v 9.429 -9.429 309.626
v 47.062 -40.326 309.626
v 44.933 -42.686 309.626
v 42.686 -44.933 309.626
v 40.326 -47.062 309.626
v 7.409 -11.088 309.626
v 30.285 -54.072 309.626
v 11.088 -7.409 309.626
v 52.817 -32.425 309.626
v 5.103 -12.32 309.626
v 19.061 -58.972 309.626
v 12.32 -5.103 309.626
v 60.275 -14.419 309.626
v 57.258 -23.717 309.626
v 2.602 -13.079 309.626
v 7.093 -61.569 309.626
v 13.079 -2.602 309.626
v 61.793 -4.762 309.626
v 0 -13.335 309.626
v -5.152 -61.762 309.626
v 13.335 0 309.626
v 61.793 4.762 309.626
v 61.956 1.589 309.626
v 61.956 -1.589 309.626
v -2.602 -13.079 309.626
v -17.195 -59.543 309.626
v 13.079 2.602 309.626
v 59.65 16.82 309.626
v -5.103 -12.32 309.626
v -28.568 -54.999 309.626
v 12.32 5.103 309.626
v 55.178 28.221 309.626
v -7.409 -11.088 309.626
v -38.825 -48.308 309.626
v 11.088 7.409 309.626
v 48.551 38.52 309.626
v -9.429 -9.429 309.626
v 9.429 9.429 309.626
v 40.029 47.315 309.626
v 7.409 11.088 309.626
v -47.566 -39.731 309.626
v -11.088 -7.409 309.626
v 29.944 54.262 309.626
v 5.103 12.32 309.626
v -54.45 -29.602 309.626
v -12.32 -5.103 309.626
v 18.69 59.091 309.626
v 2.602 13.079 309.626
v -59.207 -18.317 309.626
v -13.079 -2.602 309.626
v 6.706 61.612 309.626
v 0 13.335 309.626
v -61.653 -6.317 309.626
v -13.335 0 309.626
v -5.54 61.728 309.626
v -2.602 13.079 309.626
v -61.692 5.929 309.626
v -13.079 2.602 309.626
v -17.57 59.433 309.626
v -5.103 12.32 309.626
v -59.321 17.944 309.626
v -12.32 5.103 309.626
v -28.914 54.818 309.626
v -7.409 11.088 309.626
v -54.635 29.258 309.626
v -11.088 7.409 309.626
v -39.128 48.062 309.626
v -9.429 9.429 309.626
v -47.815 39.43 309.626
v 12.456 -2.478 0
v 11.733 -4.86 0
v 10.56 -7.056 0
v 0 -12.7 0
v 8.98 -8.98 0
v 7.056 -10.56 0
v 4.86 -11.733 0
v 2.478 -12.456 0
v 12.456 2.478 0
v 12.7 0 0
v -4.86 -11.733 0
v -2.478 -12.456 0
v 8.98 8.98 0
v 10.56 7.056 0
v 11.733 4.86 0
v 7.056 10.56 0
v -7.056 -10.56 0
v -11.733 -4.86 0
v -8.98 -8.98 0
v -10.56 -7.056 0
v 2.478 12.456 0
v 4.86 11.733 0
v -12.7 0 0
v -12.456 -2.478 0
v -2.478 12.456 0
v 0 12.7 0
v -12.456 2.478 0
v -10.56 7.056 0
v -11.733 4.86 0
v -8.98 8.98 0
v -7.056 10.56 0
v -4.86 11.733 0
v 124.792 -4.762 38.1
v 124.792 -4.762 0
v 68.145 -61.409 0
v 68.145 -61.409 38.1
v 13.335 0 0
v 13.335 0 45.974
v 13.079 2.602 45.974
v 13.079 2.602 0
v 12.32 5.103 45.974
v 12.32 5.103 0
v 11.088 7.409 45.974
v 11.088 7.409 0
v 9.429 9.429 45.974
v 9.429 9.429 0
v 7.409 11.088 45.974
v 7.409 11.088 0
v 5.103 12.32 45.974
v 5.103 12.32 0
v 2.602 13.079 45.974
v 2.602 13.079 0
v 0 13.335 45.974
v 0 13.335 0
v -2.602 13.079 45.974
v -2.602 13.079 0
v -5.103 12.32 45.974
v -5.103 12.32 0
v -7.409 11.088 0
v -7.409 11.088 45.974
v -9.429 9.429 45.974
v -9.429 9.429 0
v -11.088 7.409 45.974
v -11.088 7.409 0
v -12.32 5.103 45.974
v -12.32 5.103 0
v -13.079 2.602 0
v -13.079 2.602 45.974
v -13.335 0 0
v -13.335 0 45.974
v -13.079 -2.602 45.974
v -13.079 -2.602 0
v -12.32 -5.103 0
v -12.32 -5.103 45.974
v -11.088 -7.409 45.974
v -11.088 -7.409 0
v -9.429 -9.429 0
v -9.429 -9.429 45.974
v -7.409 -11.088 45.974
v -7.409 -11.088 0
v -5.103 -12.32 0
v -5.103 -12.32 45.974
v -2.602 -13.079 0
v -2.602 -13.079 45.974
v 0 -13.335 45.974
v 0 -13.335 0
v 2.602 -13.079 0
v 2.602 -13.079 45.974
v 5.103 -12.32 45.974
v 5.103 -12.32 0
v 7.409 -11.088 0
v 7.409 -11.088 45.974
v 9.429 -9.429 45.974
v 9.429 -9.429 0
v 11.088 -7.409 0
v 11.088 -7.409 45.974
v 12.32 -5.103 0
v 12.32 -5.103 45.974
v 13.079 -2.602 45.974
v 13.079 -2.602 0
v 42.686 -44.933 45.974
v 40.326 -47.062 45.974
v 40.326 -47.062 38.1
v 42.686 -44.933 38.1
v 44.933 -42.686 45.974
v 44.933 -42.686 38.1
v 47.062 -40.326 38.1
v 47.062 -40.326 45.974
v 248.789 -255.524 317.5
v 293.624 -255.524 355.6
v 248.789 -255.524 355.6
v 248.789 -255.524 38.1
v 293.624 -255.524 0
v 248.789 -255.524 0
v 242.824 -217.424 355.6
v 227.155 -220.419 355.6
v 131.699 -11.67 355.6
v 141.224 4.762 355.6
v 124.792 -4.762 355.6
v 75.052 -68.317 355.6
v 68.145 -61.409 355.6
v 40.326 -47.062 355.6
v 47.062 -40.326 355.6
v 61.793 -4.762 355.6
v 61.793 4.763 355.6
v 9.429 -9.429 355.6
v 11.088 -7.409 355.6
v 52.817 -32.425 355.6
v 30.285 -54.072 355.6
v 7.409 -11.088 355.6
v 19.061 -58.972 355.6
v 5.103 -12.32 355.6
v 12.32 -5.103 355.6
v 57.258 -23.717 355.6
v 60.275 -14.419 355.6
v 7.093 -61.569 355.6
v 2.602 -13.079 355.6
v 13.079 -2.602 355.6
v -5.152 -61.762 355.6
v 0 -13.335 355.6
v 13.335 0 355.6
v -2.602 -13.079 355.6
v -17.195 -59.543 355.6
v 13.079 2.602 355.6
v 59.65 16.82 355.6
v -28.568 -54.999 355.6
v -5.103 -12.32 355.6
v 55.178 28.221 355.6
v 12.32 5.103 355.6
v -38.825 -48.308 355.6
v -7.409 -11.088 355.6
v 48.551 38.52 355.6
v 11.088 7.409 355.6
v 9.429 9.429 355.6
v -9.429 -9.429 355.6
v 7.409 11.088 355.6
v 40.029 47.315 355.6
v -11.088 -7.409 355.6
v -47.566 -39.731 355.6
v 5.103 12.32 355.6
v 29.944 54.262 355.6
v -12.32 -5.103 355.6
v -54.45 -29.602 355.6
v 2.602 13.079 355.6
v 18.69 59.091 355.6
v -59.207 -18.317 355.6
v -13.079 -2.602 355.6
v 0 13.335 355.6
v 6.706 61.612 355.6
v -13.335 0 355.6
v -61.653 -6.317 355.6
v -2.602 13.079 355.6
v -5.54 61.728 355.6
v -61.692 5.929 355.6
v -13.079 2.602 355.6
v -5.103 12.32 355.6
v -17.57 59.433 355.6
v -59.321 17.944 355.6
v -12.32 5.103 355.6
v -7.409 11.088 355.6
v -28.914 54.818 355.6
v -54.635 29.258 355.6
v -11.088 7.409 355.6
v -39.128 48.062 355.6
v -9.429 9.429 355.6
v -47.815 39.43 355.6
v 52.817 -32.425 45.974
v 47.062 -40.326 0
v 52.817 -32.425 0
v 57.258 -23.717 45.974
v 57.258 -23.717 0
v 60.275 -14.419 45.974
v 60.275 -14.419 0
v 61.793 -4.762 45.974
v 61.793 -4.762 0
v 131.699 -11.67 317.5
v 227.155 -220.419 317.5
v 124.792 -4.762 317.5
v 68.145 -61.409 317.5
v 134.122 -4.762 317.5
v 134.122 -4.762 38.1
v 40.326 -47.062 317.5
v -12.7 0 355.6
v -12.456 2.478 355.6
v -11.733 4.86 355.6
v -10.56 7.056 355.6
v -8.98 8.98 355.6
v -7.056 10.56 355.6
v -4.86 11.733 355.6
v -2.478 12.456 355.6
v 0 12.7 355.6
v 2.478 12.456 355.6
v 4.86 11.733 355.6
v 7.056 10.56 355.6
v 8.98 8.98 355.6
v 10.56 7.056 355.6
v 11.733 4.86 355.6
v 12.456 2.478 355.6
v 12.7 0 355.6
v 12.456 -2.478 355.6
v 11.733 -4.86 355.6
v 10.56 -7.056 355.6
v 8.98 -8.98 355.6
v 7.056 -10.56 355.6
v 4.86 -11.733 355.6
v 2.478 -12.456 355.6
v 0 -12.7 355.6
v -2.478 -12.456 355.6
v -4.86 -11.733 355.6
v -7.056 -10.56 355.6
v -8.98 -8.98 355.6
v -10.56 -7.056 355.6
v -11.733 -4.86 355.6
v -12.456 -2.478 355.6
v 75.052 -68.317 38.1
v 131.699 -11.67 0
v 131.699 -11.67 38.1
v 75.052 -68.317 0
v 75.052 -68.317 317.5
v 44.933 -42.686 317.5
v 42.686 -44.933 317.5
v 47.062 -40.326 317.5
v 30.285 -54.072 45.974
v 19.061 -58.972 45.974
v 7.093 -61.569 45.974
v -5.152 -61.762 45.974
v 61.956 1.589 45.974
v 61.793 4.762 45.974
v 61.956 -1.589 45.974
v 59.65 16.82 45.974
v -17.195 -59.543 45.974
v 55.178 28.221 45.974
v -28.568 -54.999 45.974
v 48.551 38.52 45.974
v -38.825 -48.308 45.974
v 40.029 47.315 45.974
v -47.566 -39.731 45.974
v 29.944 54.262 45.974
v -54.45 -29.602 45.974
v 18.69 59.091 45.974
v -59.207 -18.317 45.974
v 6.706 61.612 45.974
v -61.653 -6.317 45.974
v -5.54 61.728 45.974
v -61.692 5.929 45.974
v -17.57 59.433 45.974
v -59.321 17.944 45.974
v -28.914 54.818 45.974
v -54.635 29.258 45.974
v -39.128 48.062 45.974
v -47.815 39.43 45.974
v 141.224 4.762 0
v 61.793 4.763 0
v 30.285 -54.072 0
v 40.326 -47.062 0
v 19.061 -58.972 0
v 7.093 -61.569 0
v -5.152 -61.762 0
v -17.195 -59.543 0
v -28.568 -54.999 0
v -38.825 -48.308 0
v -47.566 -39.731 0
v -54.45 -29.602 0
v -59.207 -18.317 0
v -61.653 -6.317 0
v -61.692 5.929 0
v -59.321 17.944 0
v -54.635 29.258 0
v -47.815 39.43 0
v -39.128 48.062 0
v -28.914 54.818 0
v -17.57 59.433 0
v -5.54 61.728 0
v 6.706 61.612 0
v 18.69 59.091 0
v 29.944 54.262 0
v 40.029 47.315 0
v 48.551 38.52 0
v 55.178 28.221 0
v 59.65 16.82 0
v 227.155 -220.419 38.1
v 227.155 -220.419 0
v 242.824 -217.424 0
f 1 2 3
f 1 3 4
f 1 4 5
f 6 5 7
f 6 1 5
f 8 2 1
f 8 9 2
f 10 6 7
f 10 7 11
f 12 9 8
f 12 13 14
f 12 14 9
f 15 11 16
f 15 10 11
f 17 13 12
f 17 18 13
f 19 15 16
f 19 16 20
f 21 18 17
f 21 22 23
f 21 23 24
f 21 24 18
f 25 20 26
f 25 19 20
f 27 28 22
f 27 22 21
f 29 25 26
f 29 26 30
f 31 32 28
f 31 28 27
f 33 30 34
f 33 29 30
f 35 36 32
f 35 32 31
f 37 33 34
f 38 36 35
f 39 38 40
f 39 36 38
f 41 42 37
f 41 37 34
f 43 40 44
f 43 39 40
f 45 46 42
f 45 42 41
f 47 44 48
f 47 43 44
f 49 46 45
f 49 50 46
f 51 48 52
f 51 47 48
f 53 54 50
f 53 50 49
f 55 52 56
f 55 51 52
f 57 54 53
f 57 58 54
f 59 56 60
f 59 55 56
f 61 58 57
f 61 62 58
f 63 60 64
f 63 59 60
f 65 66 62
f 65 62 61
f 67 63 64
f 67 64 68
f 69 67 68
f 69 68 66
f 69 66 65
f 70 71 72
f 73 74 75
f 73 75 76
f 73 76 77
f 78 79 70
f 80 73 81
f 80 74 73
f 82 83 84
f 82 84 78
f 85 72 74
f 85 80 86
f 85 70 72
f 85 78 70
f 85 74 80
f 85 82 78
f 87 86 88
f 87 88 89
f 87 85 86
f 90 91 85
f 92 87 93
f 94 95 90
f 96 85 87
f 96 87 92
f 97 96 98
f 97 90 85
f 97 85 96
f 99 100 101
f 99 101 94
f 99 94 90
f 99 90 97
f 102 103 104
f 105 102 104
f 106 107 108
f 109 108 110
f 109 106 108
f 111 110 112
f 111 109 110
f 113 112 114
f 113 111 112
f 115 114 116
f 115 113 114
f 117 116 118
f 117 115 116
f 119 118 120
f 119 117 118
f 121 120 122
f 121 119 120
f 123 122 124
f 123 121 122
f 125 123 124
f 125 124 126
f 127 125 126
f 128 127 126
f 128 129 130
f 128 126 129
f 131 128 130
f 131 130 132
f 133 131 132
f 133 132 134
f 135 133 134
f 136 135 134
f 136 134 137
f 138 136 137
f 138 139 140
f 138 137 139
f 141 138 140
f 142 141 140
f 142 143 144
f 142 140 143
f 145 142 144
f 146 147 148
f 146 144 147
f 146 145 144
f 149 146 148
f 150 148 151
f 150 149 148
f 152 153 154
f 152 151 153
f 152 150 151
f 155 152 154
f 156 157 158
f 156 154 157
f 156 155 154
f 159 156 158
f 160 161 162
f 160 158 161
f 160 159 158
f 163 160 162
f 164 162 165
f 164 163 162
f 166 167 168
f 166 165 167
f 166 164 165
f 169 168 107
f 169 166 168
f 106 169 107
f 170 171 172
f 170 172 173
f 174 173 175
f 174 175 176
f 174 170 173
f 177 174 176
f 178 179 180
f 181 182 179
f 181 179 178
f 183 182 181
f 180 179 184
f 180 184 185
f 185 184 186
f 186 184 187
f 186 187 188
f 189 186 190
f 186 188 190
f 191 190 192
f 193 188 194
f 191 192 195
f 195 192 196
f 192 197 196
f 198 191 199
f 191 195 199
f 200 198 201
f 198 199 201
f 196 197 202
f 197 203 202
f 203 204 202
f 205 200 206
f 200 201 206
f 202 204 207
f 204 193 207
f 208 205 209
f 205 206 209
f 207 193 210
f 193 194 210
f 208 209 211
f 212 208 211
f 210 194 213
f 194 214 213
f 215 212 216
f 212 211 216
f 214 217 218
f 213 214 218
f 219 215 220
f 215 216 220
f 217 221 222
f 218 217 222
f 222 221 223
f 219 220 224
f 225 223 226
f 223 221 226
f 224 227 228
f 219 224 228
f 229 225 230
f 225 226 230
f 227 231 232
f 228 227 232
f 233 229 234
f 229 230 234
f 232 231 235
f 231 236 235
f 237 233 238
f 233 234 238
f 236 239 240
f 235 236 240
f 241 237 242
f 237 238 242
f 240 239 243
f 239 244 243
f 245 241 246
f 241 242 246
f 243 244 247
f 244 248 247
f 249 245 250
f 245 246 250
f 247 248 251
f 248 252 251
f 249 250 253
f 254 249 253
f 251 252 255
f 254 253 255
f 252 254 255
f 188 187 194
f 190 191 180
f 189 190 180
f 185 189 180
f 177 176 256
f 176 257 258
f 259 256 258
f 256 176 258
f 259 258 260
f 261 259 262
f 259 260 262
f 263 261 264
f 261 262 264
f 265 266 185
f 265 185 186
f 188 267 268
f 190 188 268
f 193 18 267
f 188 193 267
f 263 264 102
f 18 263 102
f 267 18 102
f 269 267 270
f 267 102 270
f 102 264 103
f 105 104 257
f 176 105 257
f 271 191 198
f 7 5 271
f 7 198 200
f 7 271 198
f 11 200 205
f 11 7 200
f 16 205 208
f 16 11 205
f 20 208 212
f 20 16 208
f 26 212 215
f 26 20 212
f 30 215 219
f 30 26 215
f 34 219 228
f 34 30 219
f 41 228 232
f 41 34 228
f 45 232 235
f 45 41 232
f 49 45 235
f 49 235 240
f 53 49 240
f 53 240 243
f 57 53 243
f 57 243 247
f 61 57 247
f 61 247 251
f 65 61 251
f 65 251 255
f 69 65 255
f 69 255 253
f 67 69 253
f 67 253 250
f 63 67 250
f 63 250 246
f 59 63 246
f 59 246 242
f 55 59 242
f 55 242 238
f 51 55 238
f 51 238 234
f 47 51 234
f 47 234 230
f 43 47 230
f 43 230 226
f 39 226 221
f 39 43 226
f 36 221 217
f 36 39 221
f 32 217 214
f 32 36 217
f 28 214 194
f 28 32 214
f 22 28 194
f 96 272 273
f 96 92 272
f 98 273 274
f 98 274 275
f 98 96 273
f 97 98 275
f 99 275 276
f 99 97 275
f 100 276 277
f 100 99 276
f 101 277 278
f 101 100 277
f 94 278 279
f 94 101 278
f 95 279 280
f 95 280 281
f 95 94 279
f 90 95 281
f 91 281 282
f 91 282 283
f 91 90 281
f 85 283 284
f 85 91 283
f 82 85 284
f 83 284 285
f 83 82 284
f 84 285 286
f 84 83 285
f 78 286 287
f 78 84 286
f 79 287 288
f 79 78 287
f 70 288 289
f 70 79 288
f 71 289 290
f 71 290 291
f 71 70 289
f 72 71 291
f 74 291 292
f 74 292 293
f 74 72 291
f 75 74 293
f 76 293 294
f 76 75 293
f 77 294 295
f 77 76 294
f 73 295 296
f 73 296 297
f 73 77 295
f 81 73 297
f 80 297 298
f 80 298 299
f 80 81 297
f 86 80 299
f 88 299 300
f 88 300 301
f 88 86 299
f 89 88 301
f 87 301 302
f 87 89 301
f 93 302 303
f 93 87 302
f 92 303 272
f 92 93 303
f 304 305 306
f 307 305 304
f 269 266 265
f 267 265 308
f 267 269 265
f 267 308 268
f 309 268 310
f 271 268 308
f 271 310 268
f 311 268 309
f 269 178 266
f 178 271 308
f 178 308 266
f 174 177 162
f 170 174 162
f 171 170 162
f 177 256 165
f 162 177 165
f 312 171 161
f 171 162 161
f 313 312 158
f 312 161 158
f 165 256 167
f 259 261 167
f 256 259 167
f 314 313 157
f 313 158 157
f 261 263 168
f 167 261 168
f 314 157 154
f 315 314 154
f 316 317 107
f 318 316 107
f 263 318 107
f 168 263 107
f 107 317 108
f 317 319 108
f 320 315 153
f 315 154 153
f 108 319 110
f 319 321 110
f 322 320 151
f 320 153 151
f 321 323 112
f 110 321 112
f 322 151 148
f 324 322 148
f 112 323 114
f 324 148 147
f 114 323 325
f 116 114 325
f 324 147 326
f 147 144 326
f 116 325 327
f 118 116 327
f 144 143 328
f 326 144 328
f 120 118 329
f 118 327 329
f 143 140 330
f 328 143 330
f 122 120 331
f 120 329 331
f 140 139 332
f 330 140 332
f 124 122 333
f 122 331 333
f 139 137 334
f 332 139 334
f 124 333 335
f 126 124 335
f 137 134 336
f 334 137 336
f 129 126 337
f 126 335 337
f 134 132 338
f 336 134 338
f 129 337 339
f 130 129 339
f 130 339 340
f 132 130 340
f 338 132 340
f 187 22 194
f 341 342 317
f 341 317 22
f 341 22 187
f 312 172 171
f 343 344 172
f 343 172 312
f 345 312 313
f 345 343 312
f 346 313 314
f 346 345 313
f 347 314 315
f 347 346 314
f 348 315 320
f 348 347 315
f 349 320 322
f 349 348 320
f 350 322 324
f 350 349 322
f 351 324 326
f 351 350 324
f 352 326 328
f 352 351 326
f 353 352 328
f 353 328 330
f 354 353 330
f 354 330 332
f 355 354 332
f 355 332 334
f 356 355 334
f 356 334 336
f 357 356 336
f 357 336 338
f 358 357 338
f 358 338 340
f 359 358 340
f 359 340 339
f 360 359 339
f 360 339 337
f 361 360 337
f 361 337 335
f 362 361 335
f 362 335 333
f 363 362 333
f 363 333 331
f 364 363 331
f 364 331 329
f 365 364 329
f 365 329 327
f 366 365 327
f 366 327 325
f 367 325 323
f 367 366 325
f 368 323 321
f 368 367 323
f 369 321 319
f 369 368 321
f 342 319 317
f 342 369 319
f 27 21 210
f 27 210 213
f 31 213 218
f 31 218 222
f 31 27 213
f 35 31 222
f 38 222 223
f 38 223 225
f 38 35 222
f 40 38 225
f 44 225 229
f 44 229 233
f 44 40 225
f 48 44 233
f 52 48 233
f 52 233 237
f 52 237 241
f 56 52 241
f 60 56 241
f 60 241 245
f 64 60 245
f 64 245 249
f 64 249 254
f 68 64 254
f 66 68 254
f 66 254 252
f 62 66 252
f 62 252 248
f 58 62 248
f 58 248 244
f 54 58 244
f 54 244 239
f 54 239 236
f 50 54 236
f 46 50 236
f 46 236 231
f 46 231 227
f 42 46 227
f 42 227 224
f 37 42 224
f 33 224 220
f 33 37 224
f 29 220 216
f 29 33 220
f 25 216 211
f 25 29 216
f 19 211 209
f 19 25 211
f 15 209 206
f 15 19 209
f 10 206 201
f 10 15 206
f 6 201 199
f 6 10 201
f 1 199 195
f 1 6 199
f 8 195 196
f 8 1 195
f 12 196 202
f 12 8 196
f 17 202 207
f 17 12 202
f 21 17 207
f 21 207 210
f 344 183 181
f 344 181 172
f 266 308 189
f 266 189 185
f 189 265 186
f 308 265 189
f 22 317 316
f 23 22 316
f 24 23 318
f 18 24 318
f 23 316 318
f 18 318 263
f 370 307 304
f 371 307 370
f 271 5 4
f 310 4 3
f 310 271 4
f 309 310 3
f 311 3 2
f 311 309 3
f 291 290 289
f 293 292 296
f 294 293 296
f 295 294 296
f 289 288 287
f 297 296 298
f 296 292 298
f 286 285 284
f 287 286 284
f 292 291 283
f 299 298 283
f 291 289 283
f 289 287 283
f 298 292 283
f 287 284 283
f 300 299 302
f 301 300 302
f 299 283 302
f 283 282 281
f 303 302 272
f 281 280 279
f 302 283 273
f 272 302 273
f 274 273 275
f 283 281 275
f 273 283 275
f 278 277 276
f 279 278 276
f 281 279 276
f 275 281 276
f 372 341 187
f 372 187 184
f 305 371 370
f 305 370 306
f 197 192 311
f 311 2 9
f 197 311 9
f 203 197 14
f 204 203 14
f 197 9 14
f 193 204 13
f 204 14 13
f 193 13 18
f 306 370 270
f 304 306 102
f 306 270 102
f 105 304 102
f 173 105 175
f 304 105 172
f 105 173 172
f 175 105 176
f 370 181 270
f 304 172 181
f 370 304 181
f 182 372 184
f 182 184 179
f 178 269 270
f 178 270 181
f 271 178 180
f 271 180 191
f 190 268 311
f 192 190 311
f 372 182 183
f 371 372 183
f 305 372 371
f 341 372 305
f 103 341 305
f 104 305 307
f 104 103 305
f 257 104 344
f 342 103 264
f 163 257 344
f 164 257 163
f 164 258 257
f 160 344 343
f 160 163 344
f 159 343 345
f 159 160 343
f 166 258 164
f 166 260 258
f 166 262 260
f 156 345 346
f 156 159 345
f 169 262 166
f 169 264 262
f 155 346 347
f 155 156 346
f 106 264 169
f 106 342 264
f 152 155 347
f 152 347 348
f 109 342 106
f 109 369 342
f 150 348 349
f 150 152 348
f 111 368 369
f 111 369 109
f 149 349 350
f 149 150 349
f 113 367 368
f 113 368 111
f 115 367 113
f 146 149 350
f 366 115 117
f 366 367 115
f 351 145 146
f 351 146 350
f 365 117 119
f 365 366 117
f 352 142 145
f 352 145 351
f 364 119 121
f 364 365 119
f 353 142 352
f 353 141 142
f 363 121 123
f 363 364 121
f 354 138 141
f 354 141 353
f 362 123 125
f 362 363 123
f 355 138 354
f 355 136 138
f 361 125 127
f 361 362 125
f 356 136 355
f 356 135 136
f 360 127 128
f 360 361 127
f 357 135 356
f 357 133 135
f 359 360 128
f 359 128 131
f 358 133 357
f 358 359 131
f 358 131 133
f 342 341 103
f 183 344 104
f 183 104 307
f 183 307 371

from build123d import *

# Parameters (mm, degrees)
SKETCH1_R           = 13.335
BOSS_EXTRUDE1_DEPTH = 355.6
SKETCH4_R           = 61.976
SKETCH4_R_2         = 13.335
CUT_EXTRUDE1_DEPTH  = 131.826
SKETCH5_R           = 12.7
BOSS_EXTRUDE3_DEPTH = 177.8
CUT_EXTRUDE2_START  = -139.7
CUT_EXTRUDE2_DEPTH  = 279.4


# Read off the part's stored shape, not the designer's step: Cut-Extrude2
with BuildPart() as part:
    # Sketch1 → Boss-Extrude1 (new body)
    with BuildSketch(Plane.XY):
        with BuildLine():
            Line((61.792743666, 4.7625), (141.224, 4.7625))
            Line((141.224, 4.7625), (242.824, -217.424))
            Line((242.824, -217.424), (293.624, -255.524))
            Line((293.624, -255.524), (248.788807909, -255.524))
            Line((248.788807909, -255.524), (40.326472029, -47.06166412))
            ThreePointArc((40.326472029, -47.06166412), (-57.258357907, 23.717188404), (61.792743666, 4.7625))
        make_face()
        Circle(SKETCH1_R, mode=Mode.SUBTRACT)
        Polygon((227.154568259, -220.419376168), (131.699, -11.669980332), (75.052086211, -68.316894121), align=None, mode=Mode.SUBTRACT)
        with BuildLine():
            Line((124.791519668, -4.7625), (68.144605879, -61.409413789))
            Line((68.144605879, -61.409413789), (47.06166412, -40.326472029))
            ThreePointArc((47.06166412, -40.326472029), (57.258357907, -23.717188404), (61.792743666, -4.7625))
            Line((61.792743666, -4.7625), (124.791519668, -4.7625))
        make_face(mode=Mode.SUBTRACT)
    extrude(amount=BOSS_EXTRUDE1_DEPTH)

    # Sketch4 → Cut-Extrude1 (cut, symmetric)
    with BuildSketch(Plane(origin=(0, 0, 177.8), x_dir=(-1, 0, 0), z_dir=(0, 0, -1))):
        Circle(SKETCH4_R)
        Circle(SKETCH4_R_2, mode=Mode.SUBTRACT)
    extrude(amount=CUT_EXTRUDE1_DEPTH, both=True, mode=Mode.SUBTRACT)

    # Cut-Extrude2 outline → Cut-Extrude2 (cut)
    with BuildSketch(Plane(origin=(0, 0, 177.8), x_dir=(-1, 0, 0), z_dir=(0, 0, -1)).offset(CUT_EXTRUDE2_START)):
        with BuildLine():
            Line((-124.791519668, -4.7625), (-134.122217455, -4.7625))
            Line((-134.122217455, -4.7625), (-248.788807909, -255.524))
            Line((-248.788807909, -255.524), (-40.326472029, -47.06166412))
            ThreePointArc((-40.326472029, -47.06166412), (-43.823649871, -43.823649871), (-47.06166412, -40.326472029))
            Line((-47.06166412, -40.326472029), (-68.144605879, -61.409413789))
            Line((-68.144605879, -61.409413789), (-124.791519668, -4.7625))
        make_face()
        Polygon((-131.699, -11.669980332), (-75.052086211, -68.316894121), (-227.154568259, -220.419376168), align=None, mode=Mode.SUBTRACT)
    extrude(amount=CUT_EXTRUDE2_DEPTH, mode=Mode.SUBTRACT)


with BuildPart() as body_2:
    # Sketch5 → Boss-Extrude3 (new, symmetric)
    with BuildSketch(Plane(origin=(0, 0, 177.8), x_dir=(-1, 0, 0), z_dir=(0, 0, -1))):
        Circle(SKETCH5_R)
    extrude(amount=BOSS_EXTRUDE3_DEPTH, both=True)


solid = Compound([part.part, body_2.part])
